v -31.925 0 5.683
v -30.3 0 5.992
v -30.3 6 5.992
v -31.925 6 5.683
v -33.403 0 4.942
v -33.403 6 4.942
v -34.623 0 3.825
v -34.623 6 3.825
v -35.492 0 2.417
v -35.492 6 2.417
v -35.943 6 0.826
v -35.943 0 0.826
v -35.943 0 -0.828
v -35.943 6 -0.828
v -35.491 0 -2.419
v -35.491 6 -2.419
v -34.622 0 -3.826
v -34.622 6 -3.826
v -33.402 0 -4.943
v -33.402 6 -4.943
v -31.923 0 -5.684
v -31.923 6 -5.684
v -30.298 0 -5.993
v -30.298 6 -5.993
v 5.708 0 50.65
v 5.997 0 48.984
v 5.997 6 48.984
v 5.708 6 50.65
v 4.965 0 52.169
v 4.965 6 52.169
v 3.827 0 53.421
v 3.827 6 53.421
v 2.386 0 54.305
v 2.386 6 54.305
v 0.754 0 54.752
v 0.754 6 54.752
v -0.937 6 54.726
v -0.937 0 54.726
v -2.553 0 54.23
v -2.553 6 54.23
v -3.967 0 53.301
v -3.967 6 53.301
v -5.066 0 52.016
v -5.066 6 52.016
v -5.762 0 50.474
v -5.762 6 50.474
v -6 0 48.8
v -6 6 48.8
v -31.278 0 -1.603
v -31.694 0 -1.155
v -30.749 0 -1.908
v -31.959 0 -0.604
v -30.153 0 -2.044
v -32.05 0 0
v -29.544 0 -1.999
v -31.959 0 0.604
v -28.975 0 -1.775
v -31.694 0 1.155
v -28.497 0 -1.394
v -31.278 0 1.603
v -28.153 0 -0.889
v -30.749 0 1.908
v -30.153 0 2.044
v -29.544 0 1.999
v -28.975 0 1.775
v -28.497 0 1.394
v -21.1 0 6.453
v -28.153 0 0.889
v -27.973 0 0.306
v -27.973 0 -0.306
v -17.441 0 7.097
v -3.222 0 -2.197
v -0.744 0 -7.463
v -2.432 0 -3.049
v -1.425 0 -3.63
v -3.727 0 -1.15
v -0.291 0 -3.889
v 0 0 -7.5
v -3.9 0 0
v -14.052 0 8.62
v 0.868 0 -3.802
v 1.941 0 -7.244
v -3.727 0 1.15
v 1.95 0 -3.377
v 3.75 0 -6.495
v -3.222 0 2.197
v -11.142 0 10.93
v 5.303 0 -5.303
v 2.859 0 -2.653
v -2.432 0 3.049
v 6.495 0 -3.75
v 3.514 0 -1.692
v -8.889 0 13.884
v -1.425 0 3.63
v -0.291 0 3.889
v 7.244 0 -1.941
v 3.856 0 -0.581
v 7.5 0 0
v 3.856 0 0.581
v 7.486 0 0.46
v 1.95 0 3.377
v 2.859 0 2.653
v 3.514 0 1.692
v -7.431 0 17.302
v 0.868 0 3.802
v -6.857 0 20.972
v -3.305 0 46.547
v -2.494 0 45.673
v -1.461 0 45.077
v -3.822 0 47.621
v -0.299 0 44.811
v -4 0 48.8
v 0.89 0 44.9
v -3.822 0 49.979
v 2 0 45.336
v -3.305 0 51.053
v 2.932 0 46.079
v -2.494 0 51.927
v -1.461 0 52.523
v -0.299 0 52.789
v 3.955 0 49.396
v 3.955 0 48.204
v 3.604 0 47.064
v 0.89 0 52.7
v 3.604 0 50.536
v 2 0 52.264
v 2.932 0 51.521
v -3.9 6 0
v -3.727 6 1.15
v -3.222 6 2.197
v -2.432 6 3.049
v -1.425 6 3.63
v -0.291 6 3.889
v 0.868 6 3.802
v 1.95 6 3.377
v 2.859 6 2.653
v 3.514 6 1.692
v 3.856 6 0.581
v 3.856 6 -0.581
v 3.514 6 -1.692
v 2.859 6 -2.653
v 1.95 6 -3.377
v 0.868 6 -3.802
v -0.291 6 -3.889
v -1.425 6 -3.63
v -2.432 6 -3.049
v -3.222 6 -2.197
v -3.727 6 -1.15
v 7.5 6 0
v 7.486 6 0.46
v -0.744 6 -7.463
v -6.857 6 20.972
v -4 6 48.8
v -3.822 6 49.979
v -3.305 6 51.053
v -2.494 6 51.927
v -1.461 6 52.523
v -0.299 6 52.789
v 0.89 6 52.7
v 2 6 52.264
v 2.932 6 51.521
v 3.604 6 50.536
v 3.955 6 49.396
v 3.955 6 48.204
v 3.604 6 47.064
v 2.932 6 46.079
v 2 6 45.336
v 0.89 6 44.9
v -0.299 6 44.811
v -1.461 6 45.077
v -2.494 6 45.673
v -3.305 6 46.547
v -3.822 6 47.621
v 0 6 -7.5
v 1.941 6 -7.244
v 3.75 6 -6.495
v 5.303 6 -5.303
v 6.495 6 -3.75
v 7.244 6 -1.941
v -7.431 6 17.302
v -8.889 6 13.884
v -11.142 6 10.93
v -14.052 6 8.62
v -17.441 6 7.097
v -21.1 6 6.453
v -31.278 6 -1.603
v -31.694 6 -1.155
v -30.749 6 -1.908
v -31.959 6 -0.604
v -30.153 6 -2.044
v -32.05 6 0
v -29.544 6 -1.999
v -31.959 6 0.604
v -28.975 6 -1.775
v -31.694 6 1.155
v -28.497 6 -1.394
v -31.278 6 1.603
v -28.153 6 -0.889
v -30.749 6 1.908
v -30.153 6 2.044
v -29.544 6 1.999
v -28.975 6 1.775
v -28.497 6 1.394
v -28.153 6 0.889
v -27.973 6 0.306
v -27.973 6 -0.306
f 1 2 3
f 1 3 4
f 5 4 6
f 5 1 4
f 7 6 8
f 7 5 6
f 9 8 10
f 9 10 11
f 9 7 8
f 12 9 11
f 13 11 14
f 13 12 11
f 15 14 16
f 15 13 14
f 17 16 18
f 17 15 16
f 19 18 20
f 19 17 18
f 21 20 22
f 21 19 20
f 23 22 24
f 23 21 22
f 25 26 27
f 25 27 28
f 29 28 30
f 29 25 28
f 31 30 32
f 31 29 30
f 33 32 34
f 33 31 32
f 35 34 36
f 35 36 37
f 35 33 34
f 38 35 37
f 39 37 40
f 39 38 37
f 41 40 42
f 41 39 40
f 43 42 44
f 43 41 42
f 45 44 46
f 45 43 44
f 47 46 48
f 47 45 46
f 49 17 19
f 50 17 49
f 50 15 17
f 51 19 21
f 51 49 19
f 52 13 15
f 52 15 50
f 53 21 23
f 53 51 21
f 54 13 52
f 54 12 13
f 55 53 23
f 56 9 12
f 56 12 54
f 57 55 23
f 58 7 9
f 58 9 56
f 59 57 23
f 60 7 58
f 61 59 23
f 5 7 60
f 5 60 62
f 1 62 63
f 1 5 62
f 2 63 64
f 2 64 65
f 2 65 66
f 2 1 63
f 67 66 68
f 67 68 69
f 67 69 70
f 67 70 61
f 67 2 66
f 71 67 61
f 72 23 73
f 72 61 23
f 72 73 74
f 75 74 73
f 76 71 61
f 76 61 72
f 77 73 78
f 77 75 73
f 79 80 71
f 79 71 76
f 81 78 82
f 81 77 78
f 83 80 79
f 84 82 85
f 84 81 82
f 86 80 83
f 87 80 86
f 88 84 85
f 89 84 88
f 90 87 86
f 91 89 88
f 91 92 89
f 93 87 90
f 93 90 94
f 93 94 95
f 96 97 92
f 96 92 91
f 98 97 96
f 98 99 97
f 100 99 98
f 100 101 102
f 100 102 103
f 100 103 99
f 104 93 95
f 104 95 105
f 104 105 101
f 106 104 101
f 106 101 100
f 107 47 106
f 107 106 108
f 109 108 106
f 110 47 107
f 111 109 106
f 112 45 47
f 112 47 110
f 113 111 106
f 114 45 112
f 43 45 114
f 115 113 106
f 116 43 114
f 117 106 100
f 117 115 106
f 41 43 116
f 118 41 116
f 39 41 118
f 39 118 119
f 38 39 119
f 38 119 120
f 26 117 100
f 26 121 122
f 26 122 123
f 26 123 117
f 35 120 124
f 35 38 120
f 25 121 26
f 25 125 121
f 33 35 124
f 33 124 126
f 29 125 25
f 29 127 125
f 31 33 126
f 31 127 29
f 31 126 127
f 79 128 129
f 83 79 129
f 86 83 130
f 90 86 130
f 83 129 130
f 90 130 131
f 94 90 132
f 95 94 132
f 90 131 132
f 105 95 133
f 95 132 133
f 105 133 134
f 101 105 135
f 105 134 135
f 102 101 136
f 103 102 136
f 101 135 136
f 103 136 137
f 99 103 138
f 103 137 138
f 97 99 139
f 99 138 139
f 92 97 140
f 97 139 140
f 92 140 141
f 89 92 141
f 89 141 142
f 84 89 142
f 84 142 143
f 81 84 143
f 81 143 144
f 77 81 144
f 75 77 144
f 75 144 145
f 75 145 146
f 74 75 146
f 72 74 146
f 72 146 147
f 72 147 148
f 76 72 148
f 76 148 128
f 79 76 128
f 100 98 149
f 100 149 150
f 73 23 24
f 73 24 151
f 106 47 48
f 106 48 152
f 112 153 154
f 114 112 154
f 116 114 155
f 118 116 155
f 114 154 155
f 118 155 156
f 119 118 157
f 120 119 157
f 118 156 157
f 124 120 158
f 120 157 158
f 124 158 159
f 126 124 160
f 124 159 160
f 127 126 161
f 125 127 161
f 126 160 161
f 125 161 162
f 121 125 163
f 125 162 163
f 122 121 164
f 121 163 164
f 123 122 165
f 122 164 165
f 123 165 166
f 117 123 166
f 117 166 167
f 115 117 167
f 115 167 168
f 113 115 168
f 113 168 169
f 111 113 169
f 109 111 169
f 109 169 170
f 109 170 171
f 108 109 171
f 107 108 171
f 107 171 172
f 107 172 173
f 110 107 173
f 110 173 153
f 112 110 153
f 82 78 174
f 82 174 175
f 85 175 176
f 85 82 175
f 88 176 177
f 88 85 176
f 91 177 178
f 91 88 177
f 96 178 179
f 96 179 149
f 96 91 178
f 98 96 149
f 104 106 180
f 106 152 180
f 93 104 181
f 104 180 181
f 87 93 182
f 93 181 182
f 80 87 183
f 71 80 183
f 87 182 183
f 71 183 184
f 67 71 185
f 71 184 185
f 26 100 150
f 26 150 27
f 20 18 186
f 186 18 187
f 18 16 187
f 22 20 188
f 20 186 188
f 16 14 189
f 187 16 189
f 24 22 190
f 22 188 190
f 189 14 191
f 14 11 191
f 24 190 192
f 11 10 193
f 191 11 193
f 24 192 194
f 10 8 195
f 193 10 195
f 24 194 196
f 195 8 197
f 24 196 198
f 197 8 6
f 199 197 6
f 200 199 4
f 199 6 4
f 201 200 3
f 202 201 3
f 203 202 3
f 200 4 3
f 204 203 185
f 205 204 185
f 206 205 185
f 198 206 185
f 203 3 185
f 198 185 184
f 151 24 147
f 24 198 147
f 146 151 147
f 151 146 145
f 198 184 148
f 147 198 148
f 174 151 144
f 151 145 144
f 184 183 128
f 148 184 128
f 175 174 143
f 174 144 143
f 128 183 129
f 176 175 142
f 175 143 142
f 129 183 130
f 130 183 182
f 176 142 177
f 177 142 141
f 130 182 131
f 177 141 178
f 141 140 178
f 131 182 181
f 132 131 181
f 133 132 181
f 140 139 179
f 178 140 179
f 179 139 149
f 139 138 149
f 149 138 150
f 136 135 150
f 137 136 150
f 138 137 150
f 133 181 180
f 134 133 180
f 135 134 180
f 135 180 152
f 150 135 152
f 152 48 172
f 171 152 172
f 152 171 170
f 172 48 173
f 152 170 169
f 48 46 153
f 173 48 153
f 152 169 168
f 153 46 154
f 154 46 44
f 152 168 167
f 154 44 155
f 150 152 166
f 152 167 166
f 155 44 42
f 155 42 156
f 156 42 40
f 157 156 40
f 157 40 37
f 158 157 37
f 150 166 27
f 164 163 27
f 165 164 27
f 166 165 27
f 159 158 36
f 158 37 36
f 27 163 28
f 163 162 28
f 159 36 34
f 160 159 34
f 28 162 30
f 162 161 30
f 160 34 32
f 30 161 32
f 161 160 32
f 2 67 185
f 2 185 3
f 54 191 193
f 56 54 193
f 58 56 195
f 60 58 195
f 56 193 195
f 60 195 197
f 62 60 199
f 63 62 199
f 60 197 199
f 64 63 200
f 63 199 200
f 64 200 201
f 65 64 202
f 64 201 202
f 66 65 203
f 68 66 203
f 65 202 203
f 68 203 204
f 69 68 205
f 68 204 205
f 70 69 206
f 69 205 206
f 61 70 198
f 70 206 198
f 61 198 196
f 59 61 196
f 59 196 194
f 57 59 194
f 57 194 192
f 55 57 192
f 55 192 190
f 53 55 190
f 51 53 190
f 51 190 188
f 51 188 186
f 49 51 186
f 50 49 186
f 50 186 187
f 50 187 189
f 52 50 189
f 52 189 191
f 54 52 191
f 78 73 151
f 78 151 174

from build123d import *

# Parameters (mm, degrees)
F1_DEPTH = 6
F3_D     = 4.1
F4_D     = 8
F5_D     = 7.8
F6_R     = 15


with BuildPart() as f1:
    # F0 (on Front) → F1 (new body)
    with BuildSketch(Plane.XZ):
        with BuildLine():
            Line((7.4858944747, 0.4597650633), (5.9971782314, 48.9839925561))
            ThreePointArc((5.9971782314, 48.9839925561), (-0.0920070963, 54.7992945164), (-6, 48.8))
            Line((-6, 48.8), (-7.2834242523, 7.1447653329))
            Line((-7.2834242523, 7.1447653329), (-30.3, 5.9924953066))
            ThreePointArc((-30.3, 5.9924953066), (-35.9999999283, -0.0009276797), (-30.298146947, -5.9925877881))
            Line((-30.298146947, -5.9925877881), (-0.7444465641, -7.4629618325))
            Line((-0.7444465641, -7.4629618325), (0, -7.5))
            ThreePointArc((0, -7.5), (5.3033008589, -5.3033008589), (7.5, 0))
            Line((7.5, 0), (7.4858944747, 0.4597650633))
        make_face()
    extrude(amount=-F1_DEPTH)

    # F3 (through all)
    with Locations(Plane.XZ):
        with Locations((-30, 0)):
            Hole(F3_D / 2)

    # F4 (through all)
    with Locations(Plane.XZ):
        with Locations((0, 48.8)):
            Hole(F4_D / 2)

    # F5 (through all)
    with Locations(Plane.XZ):
        with Locations((0, 0)):
            Hole(F5_D / 2)

    # F6
    f6_edges = [f1.edges().sort_by_distance(p)[0] for p in [
        (-7.283424, 3, 7.144765),
    ]]
    fillet(f6_edges, radius=F6_R)


solid = f1.part
